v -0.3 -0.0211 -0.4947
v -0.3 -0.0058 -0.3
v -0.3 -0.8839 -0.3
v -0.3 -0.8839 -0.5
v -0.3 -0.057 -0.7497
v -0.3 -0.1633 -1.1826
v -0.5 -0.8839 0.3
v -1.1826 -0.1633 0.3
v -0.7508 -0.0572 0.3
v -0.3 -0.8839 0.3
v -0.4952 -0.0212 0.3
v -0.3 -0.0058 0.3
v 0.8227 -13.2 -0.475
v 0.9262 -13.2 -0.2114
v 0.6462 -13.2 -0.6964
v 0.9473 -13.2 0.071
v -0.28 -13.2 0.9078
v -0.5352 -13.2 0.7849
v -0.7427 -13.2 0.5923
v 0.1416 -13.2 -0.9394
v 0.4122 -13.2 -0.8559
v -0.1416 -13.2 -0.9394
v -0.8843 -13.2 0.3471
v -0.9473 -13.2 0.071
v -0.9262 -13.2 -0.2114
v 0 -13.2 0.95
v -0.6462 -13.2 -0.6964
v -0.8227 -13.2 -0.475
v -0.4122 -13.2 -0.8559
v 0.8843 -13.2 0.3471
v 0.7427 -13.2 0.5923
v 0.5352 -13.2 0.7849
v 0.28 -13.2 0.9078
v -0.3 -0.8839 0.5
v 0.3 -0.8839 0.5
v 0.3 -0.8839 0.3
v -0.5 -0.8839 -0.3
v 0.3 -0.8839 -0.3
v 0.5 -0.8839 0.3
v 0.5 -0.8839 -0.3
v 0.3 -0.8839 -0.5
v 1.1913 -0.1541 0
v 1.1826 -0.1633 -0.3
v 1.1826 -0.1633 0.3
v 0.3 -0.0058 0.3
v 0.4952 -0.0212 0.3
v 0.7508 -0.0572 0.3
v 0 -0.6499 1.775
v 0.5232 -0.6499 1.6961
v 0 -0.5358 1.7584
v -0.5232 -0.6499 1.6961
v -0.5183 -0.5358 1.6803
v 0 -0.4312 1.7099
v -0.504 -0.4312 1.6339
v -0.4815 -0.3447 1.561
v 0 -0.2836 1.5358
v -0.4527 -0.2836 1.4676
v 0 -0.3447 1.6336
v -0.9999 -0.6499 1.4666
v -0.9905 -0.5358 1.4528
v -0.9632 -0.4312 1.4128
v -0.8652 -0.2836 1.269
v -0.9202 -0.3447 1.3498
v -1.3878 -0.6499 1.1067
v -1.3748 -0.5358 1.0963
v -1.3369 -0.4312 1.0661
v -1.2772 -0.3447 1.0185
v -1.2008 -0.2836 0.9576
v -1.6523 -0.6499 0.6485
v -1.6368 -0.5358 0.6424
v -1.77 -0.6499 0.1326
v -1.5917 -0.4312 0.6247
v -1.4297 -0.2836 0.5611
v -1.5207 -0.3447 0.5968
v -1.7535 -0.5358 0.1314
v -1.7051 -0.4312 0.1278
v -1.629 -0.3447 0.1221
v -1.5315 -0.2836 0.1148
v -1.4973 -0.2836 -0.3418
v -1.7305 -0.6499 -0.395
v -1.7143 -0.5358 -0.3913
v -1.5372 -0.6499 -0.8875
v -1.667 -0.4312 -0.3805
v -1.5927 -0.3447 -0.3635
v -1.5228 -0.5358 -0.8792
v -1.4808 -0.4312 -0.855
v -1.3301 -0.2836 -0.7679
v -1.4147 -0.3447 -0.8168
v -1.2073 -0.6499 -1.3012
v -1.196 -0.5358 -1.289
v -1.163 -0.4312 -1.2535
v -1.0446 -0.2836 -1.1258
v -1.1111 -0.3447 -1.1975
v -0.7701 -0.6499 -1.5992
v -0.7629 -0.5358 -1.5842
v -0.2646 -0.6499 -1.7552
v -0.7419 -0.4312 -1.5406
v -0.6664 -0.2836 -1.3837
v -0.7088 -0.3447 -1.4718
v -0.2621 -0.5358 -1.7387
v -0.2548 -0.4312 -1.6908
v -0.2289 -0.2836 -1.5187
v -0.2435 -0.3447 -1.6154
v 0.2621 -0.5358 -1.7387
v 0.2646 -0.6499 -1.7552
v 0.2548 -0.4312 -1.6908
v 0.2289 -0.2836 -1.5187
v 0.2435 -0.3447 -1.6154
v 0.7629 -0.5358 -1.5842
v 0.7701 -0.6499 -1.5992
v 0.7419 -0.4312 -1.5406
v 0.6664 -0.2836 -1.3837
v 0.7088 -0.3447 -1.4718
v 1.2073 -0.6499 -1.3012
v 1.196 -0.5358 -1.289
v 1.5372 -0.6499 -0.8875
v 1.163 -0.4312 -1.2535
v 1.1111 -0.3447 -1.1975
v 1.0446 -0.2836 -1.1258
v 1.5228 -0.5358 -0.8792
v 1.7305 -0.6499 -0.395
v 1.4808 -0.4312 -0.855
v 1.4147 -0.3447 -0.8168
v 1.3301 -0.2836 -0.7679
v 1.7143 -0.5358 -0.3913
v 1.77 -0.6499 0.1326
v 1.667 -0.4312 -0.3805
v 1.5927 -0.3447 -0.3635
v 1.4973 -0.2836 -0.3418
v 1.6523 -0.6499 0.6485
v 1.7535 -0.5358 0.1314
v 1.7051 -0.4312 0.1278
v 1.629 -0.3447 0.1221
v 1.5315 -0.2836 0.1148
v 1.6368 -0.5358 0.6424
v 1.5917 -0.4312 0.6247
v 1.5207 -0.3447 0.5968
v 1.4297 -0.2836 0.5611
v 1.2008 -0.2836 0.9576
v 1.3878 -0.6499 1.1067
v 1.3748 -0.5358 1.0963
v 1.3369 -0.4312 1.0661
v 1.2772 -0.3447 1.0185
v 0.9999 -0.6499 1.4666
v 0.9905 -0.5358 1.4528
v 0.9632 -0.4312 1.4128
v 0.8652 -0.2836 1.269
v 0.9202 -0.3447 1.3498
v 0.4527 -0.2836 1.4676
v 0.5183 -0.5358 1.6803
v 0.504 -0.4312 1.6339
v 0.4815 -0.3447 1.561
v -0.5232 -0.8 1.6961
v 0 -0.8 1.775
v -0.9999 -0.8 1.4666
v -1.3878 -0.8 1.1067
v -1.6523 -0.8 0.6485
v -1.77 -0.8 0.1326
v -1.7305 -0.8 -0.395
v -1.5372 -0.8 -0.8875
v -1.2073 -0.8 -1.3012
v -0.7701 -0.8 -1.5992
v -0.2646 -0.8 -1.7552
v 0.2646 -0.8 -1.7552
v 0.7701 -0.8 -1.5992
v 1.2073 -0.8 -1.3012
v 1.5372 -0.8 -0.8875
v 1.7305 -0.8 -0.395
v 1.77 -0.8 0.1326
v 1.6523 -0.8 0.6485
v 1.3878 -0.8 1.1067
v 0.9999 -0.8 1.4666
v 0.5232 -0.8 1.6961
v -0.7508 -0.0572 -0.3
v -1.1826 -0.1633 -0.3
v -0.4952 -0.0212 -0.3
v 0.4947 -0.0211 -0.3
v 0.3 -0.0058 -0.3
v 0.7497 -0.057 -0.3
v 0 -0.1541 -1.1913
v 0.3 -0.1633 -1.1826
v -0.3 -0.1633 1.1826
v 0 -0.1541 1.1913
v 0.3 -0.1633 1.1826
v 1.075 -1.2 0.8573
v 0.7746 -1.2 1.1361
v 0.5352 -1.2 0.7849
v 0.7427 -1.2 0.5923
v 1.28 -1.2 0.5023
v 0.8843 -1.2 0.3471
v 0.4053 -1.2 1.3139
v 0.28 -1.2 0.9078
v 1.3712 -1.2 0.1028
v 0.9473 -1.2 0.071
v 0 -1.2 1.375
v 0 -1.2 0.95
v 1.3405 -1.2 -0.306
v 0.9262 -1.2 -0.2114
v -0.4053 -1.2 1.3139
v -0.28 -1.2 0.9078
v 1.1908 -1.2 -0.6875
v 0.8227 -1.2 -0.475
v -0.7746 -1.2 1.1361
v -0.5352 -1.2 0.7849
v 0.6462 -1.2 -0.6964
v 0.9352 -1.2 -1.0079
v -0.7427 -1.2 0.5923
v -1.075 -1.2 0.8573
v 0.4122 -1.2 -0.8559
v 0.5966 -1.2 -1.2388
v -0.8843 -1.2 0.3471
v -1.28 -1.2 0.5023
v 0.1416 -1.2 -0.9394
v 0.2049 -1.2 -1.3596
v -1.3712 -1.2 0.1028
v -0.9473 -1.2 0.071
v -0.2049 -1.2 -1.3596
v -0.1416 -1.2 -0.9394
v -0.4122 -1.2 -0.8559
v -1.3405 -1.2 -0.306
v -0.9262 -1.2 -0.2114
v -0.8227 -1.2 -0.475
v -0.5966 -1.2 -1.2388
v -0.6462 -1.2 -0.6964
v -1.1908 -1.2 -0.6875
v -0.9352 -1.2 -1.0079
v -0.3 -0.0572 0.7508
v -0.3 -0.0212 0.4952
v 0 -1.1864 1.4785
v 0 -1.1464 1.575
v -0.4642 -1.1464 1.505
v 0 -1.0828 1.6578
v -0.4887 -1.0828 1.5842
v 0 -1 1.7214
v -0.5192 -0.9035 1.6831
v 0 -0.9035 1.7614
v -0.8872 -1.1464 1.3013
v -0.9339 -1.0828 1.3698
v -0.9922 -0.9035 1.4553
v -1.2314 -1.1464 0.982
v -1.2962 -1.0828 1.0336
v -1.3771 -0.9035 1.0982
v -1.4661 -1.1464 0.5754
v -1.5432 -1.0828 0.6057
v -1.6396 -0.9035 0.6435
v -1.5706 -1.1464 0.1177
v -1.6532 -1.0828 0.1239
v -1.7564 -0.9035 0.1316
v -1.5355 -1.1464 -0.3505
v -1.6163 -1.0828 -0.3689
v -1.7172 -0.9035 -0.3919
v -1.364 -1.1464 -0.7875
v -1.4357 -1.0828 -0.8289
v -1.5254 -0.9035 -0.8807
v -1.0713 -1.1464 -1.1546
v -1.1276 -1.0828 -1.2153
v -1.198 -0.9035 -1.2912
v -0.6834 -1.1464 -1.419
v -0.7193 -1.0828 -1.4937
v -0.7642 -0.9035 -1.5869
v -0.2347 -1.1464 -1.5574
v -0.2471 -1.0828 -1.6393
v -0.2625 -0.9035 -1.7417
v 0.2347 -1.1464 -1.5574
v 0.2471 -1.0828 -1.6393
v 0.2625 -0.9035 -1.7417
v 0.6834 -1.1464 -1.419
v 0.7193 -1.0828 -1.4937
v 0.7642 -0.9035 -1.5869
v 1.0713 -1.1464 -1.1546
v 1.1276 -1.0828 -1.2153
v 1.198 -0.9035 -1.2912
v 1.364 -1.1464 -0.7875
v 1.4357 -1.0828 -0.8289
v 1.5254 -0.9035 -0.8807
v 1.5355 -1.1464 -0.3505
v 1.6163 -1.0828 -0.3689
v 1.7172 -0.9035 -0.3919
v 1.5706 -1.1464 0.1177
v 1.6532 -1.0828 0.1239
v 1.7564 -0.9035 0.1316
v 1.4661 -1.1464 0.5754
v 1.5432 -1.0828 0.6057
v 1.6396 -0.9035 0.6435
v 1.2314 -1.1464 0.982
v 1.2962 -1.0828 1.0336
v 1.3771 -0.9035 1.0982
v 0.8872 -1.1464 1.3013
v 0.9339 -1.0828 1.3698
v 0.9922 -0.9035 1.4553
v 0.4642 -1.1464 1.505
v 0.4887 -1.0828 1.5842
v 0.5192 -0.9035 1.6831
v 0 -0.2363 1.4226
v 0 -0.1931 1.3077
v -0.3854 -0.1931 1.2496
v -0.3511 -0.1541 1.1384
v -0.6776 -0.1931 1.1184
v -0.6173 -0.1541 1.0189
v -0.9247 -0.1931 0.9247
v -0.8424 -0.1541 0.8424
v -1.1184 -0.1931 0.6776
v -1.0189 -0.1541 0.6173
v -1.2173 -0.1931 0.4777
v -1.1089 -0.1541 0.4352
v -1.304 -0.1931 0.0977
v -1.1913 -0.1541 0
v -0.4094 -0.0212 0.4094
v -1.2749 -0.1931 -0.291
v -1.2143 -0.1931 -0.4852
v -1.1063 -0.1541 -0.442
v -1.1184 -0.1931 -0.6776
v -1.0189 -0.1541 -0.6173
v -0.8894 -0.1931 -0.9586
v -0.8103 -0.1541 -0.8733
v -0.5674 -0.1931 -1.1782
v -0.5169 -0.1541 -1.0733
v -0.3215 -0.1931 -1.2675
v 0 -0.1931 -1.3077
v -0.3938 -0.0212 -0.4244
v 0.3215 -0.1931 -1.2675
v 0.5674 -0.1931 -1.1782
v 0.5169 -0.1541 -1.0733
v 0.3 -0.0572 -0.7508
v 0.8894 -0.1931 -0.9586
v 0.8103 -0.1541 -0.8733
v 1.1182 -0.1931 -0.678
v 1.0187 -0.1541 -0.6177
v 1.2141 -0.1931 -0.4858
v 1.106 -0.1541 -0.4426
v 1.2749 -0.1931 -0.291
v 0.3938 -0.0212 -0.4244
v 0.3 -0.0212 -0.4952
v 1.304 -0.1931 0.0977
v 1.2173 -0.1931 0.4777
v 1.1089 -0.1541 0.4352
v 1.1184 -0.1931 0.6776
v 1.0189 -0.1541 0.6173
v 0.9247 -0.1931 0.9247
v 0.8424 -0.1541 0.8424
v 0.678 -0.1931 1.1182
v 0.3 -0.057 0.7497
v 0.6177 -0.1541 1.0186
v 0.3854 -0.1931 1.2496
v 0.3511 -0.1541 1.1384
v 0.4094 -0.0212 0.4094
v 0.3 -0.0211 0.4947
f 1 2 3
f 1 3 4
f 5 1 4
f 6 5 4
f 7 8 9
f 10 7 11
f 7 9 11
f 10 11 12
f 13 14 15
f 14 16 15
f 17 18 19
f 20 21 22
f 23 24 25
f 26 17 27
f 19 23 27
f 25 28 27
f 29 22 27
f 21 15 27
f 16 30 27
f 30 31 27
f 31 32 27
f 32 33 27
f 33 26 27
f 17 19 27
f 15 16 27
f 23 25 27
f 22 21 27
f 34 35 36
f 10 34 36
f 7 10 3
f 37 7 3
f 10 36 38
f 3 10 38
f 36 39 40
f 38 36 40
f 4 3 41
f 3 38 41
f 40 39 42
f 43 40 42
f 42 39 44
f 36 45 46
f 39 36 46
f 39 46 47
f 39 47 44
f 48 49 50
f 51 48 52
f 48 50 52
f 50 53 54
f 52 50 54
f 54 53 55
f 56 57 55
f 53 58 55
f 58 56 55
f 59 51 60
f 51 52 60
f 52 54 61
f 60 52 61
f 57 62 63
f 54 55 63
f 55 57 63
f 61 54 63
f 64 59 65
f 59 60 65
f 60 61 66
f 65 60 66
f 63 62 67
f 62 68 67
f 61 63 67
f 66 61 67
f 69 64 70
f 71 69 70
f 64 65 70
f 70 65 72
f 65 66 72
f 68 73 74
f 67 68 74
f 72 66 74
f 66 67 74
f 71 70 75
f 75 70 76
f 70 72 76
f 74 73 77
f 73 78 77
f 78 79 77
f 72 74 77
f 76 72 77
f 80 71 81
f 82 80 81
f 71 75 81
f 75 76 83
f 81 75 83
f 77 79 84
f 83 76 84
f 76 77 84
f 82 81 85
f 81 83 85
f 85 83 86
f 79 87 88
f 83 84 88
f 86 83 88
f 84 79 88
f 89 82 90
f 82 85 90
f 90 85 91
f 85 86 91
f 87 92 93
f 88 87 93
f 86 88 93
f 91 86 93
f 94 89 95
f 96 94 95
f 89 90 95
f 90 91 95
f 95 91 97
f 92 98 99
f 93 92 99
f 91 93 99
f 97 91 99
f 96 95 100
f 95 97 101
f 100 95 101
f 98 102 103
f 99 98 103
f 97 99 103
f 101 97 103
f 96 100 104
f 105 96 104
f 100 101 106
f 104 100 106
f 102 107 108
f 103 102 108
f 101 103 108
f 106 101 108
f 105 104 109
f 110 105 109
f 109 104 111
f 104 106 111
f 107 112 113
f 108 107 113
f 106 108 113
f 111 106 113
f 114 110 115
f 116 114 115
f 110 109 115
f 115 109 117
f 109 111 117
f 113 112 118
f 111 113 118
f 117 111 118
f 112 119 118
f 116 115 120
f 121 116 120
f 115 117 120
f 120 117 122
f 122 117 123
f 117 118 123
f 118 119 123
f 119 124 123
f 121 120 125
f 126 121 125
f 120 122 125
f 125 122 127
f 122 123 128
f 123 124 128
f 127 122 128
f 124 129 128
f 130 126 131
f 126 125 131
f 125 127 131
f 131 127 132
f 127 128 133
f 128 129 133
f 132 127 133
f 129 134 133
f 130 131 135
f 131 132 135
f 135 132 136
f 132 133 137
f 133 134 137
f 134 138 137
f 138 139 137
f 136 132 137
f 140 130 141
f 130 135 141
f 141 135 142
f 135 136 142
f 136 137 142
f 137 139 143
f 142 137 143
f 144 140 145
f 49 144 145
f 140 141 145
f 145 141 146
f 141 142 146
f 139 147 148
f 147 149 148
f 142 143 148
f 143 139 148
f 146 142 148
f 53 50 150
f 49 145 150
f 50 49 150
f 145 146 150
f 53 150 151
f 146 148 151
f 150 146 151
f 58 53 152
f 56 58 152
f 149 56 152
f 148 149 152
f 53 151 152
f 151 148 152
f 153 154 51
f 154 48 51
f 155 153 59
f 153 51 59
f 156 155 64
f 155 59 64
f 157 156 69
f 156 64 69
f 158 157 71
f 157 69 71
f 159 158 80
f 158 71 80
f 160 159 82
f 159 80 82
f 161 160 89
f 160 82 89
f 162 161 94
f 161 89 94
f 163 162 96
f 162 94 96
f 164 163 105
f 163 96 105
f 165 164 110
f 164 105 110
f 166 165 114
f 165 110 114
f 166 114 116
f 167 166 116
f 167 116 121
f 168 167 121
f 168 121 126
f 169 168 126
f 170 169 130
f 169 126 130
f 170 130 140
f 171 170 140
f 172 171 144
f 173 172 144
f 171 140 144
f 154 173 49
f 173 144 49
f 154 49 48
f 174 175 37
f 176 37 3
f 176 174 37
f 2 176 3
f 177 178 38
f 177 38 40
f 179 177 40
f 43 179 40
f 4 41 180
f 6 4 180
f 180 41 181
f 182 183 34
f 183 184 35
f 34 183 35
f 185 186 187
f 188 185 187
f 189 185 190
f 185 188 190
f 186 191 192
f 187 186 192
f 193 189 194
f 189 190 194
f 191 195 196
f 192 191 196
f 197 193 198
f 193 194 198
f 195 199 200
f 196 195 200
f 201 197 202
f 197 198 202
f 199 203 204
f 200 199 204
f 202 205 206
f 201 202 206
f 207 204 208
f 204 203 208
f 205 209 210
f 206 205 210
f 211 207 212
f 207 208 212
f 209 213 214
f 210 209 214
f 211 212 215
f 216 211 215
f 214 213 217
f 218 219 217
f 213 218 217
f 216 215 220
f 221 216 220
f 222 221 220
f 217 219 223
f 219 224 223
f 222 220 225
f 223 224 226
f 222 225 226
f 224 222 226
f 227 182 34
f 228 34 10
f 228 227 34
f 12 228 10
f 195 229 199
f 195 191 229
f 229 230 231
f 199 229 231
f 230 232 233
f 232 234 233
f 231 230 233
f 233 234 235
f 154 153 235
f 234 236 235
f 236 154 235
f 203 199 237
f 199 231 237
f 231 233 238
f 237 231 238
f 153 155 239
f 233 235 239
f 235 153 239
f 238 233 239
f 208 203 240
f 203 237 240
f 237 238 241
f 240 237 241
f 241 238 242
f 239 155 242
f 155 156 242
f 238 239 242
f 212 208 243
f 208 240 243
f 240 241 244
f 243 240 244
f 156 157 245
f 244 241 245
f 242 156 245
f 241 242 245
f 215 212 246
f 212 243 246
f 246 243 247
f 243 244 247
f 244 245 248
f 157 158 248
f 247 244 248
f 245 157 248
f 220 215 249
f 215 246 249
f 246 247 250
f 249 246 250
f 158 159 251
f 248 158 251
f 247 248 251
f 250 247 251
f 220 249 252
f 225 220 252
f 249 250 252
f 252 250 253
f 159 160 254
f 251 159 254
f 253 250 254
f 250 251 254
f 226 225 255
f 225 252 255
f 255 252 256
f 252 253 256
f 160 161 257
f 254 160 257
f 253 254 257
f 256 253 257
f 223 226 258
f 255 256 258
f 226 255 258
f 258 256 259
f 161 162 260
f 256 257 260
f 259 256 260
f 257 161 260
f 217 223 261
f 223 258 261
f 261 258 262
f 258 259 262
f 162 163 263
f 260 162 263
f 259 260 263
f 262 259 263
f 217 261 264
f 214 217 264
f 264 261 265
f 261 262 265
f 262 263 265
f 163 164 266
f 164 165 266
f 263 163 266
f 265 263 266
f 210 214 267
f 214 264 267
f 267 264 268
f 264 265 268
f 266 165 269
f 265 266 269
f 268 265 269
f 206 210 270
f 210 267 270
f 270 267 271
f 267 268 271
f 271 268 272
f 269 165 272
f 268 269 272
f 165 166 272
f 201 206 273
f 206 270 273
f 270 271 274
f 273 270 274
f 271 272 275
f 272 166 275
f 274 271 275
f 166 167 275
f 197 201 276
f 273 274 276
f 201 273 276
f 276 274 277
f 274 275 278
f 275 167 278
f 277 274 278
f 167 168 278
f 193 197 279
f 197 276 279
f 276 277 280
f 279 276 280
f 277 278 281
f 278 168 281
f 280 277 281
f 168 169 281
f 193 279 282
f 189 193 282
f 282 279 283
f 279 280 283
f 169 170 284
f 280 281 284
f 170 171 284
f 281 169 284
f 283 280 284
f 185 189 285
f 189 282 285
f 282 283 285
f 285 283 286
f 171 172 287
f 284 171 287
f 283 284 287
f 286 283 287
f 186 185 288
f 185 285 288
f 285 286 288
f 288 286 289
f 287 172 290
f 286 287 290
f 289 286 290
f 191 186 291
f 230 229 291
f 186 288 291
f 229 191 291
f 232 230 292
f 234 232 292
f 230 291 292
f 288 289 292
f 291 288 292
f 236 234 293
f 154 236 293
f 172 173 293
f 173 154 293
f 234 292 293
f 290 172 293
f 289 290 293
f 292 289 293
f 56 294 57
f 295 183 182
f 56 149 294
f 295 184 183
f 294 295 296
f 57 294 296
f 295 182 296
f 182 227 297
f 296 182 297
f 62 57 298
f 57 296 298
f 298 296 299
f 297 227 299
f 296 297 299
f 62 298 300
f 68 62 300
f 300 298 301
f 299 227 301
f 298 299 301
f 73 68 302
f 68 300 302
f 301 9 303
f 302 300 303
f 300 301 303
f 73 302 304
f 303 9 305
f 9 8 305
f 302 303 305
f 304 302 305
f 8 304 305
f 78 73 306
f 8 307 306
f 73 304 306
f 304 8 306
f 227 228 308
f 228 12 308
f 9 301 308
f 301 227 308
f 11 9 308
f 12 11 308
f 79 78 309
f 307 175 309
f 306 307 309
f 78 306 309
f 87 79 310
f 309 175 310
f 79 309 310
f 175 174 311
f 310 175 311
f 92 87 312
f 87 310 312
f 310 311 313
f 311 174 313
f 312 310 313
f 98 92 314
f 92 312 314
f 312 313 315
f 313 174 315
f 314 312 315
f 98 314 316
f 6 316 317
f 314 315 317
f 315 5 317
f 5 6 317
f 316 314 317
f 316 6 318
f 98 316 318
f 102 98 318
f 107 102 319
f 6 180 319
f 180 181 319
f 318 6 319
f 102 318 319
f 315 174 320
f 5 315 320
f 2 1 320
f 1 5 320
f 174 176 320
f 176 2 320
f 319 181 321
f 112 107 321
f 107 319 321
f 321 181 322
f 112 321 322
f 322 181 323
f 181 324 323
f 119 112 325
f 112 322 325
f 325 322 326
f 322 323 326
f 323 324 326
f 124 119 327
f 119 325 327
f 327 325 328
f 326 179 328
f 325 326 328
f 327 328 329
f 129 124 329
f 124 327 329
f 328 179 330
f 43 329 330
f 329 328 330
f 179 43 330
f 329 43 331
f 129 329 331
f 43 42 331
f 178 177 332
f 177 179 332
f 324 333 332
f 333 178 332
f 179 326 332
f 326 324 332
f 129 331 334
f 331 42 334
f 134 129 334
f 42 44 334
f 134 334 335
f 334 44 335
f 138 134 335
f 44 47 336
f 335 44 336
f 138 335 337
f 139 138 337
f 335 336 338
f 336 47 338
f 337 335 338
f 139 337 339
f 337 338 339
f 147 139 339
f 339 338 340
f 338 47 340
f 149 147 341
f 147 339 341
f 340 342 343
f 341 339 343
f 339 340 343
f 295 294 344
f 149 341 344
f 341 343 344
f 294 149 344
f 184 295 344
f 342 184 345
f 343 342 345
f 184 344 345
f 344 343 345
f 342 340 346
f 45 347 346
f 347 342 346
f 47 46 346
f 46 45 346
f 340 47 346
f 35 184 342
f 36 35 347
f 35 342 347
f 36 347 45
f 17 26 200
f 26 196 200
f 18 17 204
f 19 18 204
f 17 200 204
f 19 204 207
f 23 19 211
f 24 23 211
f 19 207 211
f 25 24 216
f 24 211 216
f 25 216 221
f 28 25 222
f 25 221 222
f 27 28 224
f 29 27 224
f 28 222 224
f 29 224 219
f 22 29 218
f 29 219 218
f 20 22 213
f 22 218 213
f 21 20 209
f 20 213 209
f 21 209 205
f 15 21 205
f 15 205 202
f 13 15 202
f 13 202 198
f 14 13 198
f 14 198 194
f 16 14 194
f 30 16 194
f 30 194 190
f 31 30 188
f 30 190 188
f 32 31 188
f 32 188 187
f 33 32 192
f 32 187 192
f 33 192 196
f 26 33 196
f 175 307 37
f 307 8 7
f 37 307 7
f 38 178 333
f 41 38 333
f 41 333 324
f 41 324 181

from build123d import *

# Parameters (mm, degrees)
CUT_EXTRUDE_1_DEPTH      = 0.3
PATTERN_CIRCULAR_1_COUNT = 2
PATTERN_CIRCULAR_1_ANGLE = 90


with BuildPart() as part:
    # 草图1 → 旋转3 (revolve)
    with BuildSketch(Plane(origin=(0, 0, 0), x_dir=(0, 0, -1), z_dir=(1, 0, 0)), mode=Mode.PRIVATE) as revolve_3_sk:
        with BuildLine():
            ThreePointArc((1.375, -1.2), (1.657842712, -1.082842712), (1.775, -0.8))
            Line((1.775, -0.8), (1.775, -0.649888064))
            ThreePointArc((1.775, -0.649888064), (1.709909462, -0.431174433), (1.535821739, -0.283641742))
            ThreePointArc((1.535821739, -0.283641742), (0.784373982, -0.052678823), (0, 0))
            Line((0, 0), (0, -13.2))
            Line((0, -13.2), (0.95, -13.2))
            Line((0.95, -13.2), (0.95, -1.2))
            Line((0.95, -1.2), (1.375, -1.2))
        make_face()
    revolve(revolve_3_sk.sketch.rotate(Axis((0, 0, 0), (0, -1, 0)), 180), axis=Axis((0, 0, 0), (0, -1, 0)))

    # 草图5 → 切除-拉伸1 (cut, symmetric)
    with BuildSketch(Plane(origin=(0, 0, 0), x_dir=(0, 0, -1), z_dir=(1, 0, 0))):
        Polygon((-1.8, 0.488536713), (-0.5, -0.8838523), (0.5, -0.8838523), (1.8, 0.488536713), align=None)
    cut_extrude_1 = extrude(amount=CUT_EXTRUDE_1_DEPTH, both=True, mode=Mode.SUBTRACT)

    # 阵列(圆周)1: 切除-拉伸1 ×2 about axis
    pattern_circular_1_axis = Axis((0, 0, 0), (0, -1, 0))
    for i in range(1, PATTERN_CIRCULAR_1_COUNT):
        add(cut_extrude_1.rotate(pattern_circular_1_axis, i * PATTERN_CIRCULAR_1_ANGLE / (PATTERN_CIRCULAR_1_COUNT - 1)), mode=Mode.SUBTRACT)


solid = part.part
